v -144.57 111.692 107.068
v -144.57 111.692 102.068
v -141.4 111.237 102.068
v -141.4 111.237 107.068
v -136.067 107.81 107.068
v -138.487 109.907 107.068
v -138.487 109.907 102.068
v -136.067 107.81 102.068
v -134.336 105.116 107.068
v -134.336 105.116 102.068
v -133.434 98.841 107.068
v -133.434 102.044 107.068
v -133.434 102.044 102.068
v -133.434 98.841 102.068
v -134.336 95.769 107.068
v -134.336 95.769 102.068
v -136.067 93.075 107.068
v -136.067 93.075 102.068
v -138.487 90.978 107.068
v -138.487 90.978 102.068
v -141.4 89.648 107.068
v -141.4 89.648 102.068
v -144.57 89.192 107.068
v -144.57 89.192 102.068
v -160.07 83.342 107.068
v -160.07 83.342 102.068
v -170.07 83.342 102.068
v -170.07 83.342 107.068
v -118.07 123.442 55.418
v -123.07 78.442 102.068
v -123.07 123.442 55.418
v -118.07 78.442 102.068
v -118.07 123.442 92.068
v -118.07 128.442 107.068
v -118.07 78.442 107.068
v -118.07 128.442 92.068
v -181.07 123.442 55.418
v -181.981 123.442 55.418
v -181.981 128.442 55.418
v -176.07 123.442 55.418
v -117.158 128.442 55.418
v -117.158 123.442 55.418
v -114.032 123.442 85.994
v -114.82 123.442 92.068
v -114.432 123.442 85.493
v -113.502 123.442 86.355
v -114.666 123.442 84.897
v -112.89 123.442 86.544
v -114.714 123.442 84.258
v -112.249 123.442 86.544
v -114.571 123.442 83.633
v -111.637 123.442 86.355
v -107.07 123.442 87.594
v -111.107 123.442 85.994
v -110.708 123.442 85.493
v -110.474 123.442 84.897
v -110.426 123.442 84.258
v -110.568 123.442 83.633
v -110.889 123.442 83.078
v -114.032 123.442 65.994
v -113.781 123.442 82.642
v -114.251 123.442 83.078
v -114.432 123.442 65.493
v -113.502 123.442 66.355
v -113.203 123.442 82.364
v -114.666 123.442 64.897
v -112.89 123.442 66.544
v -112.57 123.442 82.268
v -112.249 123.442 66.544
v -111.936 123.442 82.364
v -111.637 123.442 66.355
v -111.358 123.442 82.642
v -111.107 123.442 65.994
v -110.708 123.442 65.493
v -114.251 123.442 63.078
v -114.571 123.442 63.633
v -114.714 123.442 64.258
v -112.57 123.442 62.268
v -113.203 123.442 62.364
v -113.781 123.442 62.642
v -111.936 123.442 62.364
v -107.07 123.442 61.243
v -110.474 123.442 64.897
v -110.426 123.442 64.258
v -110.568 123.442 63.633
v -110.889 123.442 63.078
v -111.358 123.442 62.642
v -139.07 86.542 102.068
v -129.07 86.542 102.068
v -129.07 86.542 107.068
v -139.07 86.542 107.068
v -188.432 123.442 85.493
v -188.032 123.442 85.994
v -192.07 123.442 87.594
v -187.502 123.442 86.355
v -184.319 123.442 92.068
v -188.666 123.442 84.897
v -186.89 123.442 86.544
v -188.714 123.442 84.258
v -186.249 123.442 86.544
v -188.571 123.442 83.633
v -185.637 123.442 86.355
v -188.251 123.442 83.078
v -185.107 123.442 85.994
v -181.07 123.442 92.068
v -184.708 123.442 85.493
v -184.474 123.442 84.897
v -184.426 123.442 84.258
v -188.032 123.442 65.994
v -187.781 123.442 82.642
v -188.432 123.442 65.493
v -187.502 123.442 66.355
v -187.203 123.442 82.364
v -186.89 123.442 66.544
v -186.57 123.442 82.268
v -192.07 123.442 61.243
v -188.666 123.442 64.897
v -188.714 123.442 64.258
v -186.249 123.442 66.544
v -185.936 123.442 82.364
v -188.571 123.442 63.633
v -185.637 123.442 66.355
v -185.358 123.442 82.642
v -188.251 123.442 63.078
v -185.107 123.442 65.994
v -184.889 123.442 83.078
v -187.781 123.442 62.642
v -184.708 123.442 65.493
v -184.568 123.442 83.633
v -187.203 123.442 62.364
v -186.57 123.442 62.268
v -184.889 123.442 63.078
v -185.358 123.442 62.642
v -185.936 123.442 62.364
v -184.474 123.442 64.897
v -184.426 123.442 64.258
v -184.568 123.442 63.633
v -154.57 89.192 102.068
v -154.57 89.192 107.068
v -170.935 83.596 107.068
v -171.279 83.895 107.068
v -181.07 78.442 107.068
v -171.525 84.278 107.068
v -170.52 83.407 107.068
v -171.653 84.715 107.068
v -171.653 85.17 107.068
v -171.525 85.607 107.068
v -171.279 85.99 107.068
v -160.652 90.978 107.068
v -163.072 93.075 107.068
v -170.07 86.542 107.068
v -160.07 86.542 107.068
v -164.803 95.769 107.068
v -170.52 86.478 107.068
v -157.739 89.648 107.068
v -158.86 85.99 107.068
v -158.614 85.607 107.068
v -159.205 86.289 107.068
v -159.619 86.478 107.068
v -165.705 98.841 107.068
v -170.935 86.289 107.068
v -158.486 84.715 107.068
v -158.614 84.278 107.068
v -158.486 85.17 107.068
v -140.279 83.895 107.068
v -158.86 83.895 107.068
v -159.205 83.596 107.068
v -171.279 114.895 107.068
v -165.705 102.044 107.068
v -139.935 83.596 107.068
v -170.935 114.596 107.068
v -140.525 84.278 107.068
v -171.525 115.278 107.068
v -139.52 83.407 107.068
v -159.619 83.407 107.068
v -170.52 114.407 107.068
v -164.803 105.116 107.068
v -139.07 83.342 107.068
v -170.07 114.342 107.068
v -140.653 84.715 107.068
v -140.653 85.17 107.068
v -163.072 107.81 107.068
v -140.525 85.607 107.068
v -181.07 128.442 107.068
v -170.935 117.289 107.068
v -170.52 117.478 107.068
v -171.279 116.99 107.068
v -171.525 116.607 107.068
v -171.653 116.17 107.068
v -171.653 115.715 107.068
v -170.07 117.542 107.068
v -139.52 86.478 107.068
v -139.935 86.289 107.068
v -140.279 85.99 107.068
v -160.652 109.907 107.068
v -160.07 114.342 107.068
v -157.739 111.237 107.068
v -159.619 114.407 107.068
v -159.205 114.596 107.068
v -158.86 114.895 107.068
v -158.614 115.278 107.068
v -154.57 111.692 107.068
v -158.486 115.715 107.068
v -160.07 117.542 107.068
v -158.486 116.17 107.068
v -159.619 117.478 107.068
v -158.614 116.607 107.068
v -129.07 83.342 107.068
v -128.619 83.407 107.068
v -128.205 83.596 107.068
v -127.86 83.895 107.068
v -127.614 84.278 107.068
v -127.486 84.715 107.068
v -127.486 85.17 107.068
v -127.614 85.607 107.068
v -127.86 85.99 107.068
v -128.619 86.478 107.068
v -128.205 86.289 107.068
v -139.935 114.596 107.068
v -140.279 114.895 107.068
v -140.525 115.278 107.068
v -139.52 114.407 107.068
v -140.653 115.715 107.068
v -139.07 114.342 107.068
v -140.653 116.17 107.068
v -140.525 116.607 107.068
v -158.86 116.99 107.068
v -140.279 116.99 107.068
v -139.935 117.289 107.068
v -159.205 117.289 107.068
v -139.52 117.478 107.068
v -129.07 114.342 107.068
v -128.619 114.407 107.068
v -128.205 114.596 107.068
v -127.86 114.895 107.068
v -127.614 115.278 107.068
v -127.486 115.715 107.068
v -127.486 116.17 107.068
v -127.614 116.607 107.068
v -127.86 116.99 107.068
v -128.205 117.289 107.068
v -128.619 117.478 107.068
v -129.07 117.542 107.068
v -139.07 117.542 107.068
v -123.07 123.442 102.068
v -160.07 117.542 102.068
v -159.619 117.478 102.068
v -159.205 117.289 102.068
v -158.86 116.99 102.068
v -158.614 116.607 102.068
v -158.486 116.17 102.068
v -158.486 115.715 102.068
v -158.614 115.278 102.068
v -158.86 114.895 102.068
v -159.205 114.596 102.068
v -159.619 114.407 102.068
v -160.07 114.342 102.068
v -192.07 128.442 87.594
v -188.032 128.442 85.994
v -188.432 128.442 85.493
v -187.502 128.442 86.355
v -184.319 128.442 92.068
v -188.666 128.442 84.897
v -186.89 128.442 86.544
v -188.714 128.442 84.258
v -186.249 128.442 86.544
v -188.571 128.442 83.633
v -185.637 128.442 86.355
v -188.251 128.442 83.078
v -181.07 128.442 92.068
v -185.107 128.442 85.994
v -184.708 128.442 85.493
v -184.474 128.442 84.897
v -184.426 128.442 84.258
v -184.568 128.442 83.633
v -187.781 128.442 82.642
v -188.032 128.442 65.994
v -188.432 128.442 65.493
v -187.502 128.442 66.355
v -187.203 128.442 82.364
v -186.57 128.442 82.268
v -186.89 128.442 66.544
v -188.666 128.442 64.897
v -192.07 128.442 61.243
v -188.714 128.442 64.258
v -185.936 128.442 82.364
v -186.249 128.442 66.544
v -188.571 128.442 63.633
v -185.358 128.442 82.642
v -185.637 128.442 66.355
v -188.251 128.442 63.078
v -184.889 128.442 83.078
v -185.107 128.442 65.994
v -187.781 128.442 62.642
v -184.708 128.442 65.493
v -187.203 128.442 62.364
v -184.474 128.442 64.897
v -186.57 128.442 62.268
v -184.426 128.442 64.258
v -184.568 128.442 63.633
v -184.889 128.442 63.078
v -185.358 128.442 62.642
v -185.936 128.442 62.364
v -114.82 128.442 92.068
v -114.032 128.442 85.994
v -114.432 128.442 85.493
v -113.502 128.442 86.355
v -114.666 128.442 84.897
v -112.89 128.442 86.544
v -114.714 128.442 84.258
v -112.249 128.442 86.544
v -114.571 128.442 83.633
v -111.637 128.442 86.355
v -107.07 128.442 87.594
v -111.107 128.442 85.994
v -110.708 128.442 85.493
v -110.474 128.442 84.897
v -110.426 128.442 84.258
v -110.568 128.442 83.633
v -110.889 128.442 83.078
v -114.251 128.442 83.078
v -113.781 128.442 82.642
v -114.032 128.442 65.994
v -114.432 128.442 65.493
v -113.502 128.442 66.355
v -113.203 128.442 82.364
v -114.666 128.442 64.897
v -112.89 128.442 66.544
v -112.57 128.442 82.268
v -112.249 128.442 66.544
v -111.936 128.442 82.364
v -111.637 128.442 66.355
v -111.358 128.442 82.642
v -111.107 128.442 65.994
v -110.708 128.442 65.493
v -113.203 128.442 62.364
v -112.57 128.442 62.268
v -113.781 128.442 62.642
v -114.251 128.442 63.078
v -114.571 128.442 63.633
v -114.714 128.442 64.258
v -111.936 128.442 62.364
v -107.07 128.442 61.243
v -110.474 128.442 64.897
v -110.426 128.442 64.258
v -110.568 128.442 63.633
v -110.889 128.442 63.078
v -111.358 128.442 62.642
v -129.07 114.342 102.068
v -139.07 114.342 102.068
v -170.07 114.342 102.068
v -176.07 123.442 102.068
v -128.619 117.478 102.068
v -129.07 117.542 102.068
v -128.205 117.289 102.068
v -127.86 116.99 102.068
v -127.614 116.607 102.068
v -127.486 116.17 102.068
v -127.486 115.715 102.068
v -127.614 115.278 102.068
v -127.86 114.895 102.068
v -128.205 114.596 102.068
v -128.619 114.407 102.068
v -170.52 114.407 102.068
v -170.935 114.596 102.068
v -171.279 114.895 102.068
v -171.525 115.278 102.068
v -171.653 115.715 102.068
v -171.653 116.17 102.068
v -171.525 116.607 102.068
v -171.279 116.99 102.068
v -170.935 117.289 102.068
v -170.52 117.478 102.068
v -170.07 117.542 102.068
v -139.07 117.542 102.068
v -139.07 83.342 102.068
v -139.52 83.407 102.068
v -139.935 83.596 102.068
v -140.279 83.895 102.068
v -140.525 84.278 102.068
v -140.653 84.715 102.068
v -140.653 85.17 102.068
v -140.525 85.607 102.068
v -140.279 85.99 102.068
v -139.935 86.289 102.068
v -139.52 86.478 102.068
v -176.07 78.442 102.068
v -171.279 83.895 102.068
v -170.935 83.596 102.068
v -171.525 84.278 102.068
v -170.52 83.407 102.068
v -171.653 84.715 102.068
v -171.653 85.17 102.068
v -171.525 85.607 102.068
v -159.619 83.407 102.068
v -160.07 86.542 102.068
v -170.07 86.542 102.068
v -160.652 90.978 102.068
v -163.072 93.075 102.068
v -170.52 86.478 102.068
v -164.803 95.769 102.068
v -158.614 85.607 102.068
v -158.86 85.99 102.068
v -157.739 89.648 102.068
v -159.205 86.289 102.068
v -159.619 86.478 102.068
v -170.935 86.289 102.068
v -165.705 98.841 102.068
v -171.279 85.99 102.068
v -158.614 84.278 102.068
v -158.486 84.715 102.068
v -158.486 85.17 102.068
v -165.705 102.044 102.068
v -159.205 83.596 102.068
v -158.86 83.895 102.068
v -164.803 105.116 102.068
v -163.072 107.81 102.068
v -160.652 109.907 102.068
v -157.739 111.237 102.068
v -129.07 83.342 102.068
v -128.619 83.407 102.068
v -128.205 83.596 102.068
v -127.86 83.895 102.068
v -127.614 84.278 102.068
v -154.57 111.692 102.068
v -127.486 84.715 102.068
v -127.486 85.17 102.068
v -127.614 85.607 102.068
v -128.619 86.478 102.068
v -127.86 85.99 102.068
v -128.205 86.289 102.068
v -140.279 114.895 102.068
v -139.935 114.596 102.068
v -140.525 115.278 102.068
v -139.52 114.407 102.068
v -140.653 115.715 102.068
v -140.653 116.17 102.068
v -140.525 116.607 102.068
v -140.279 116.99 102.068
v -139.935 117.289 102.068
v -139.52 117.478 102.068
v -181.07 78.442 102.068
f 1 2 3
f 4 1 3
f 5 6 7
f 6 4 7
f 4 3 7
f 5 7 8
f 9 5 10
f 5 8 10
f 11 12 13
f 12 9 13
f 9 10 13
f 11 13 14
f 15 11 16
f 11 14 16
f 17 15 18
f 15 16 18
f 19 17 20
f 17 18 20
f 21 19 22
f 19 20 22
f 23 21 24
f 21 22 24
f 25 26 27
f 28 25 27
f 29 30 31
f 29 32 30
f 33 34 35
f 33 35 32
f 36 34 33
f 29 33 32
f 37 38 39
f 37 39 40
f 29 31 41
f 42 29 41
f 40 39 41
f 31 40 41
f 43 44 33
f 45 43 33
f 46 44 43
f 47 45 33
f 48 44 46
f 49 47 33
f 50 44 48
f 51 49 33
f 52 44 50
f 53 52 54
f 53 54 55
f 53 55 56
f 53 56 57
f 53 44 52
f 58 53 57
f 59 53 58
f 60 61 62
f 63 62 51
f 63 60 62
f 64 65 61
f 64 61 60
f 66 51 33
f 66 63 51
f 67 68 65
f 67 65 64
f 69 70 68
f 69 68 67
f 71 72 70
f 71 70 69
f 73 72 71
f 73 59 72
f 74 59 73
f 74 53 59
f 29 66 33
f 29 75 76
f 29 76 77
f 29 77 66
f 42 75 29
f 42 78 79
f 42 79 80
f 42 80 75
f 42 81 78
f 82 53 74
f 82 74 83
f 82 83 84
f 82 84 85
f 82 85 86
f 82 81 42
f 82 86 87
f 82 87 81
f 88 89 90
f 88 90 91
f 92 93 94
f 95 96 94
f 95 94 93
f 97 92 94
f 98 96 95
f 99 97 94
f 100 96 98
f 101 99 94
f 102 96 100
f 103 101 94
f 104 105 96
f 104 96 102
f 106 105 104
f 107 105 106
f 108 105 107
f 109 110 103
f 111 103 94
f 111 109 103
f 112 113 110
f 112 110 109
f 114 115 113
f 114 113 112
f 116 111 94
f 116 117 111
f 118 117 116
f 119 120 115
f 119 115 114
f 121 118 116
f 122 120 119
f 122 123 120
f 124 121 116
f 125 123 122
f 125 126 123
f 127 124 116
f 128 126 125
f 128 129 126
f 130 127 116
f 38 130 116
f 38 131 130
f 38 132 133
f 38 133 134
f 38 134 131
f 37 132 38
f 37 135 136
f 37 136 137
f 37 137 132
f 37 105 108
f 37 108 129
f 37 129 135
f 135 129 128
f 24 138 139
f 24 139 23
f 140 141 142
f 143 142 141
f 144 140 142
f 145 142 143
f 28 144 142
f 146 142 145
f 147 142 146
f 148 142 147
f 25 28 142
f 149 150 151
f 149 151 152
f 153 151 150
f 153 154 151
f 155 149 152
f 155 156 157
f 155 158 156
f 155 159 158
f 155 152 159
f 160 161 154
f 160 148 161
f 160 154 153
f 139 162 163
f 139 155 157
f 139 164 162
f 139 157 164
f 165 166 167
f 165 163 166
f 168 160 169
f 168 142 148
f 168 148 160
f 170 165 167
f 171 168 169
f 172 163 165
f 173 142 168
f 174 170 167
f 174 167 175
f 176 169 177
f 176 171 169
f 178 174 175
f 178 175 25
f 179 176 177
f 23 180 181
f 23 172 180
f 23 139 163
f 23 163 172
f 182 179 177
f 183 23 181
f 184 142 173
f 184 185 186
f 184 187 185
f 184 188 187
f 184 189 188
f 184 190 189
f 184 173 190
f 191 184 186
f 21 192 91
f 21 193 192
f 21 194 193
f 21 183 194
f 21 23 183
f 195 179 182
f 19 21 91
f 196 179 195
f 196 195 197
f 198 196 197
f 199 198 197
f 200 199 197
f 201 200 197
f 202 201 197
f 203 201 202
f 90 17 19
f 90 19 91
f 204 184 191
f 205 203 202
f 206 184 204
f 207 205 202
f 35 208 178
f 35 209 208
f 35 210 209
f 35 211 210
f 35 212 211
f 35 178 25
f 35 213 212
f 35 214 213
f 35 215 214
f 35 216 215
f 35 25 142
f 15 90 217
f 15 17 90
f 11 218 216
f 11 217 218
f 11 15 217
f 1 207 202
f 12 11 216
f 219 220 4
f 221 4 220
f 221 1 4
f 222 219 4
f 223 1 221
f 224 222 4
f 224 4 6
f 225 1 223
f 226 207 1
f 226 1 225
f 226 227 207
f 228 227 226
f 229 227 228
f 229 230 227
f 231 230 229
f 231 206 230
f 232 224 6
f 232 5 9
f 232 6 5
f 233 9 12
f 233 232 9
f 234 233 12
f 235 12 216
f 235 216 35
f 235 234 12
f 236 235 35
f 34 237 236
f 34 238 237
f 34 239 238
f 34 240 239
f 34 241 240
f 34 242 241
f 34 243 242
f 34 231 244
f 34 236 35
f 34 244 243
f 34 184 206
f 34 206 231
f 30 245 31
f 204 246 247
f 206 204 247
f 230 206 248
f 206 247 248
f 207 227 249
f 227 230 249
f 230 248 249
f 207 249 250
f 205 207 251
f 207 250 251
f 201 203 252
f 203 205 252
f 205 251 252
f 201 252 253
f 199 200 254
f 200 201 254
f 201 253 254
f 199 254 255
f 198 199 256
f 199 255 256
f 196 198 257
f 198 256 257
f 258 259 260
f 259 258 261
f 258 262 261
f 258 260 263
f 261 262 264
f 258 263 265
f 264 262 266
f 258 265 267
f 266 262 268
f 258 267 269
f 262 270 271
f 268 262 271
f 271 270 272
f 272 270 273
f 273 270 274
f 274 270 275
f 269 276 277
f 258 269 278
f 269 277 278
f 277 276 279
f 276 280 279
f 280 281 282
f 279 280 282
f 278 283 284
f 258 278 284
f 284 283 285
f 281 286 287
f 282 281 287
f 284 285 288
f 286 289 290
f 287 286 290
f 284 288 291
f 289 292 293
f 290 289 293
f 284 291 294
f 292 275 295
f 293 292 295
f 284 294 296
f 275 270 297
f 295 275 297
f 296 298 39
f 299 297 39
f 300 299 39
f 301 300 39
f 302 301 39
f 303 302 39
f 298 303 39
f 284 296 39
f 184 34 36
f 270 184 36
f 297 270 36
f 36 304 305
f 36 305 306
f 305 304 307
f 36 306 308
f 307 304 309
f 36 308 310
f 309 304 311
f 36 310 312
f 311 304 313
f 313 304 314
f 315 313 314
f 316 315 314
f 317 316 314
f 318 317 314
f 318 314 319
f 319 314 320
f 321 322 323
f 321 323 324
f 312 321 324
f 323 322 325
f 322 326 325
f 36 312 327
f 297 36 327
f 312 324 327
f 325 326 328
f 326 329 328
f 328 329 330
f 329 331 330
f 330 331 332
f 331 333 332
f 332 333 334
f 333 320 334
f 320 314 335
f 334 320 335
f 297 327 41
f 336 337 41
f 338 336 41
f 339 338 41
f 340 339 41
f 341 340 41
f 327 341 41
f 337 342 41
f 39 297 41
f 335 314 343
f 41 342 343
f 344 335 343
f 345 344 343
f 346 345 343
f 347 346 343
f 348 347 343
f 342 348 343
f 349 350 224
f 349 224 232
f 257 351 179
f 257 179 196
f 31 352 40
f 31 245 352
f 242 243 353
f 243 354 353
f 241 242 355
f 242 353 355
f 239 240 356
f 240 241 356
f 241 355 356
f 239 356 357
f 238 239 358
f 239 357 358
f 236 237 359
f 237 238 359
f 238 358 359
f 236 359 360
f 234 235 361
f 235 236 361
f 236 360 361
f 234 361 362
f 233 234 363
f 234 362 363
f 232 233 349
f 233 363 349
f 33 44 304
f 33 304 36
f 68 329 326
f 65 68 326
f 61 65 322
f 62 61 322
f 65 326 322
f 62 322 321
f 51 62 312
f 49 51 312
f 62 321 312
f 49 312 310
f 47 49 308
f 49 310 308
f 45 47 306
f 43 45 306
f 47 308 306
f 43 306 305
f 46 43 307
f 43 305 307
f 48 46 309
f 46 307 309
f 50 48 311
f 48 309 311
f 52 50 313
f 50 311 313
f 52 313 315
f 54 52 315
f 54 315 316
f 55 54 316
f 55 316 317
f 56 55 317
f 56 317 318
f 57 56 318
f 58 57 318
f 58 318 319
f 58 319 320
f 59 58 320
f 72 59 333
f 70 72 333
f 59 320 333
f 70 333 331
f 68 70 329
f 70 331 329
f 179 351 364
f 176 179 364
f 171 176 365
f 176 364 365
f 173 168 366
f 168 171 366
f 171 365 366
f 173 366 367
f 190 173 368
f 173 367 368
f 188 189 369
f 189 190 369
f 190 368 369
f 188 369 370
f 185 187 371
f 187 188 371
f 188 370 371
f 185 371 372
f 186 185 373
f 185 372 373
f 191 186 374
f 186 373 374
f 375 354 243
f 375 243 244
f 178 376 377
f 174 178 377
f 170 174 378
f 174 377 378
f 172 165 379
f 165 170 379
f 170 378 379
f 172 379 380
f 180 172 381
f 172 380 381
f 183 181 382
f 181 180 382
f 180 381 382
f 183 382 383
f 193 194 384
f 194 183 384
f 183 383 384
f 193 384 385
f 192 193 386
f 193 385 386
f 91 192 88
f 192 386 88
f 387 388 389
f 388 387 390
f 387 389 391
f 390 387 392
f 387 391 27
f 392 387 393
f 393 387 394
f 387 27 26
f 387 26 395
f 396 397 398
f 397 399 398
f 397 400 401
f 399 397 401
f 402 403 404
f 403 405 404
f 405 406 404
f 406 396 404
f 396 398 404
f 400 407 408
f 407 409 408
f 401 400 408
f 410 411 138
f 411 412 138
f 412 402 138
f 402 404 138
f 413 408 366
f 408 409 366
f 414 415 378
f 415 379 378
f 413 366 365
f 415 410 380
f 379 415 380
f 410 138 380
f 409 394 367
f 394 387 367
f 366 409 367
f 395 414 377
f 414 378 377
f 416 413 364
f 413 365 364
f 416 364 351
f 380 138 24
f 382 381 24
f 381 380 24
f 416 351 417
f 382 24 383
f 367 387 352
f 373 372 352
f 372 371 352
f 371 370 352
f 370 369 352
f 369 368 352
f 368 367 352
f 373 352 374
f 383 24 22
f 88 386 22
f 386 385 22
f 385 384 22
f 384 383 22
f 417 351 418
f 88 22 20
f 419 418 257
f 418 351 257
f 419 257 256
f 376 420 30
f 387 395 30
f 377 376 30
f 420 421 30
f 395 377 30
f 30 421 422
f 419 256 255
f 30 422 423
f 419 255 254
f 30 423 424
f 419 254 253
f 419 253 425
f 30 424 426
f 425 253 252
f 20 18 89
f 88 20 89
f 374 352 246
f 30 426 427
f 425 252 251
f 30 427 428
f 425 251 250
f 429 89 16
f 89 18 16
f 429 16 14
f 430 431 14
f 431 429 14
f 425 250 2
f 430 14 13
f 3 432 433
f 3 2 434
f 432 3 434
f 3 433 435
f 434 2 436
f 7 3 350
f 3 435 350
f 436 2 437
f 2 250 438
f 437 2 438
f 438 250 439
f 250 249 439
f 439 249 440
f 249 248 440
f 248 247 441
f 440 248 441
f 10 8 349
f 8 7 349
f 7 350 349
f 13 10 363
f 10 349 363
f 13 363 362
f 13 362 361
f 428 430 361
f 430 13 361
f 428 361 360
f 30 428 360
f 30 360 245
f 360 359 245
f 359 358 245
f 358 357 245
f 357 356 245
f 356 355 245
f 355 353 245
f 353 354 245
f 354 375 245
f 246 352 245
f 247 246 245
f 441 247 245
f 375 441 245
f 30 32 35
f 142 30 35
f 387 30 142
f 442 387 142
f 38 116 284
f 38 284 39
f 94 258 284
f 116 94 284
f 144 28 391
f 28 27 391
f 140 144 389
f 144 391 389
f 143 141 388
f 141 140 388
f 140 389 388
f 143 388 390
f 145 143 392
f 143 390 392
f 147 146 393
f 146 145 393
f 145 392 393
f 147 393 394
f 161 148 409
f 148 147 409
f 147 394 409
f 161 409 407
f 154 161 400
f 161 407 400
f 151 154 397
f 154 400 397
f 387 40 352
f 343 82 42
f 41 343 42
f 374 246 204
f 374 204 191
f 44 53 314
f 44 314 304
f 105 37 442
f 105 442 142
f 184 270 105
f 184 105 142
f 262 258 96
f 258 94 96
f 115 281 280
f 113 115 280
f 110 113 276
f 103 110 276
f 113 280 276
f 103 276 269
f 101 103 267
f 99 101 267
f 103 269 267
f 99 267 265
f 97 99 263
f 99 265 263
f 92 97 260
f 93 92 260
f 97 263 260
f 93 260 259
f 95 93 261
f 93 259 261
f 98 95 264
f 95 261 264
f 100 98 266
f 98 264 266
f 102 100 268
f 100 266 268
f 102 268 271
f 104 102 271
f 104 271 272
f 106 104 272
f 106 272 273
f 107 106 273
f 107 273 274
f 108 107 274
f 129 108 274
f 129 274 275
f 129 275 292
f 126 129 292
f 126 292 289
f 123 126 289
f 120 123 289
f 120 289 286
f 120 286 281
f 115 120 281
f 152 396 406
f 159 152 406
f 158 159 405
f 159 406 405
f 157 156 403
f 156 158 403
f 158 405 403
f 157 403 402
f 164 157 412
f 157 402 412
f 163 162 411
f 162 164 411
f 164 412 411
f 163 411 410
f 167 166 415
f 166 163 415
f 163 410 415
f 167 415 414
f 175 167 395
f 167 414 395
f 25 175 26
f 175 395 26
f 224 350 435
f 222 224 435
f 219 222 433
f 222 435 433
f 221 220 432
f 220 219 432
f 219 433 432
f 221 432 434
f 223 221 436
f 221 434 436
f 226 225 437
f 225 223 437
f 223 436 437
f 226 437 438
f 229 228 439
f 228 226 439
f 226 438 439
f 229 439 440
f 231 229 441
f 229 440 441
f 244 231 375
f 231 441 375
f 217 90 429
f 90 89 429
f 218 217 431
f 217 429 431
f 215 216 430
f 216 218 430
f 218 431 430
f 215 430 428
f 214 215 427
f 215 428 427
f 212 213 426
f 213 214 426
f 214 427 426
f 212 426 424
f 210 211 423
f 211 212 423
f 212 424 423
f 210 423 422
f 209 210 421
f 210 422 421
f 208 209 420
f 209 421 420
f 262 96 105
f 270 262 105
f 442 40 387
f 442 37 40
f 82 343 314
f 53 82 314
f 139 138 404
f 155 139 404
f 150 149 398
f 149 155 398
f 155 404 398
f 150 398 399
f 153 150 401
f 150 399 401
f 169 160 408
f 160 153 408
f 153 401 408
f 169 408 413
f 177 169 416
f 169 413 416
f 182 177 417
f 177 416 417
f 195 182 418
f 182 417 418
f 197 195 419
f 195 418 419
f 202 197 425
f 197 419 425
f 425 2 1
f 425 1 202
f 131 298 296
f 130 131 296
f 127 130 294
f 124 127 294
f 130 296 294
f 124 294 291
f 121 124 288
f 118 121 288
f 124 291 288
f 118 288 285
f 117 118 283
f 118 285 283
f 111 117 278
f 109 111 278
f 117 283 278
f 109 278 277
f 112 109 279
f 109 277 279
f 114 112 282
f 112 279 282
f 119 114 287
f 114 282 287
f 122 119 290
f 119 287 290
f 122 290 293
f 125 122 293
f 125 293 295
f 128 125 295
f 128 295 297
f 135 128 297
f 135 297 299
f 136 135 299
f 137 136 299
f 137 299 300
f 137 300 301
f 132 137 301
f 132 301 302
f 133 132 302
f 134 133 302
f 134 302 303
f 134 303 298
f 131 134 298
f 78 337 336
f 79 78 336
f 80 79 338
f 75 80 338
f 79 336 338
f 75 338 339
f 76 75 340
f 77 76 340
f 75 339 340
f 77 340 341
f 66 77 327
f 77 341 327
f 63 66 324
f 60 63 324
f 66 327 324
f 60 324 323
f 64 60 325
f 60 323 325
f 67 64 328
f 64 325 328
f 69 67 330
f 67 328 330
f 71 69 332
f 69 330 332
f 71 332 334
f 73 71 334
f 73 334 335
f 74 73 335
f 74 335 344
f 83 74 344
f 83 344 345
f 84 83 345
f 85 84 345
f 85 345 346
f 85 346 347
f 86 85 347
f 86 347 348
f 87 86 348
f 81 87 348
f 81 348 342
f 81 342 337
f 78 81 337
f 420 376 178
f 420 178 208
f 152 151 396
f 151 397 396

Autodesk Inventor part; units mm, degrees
ref_plane "XZ Plane" through (0, 0, 0) normal (0, 1, 0) x (-1, 0, 0)
ref_plane "XY Plane" through (0, 0, 0) normal (0, 0, 1) x (1, 0, 0)
ref_plane "Work Plane1" through (-118.9196, 128.4425, 80.2184) normal (0, -1, 0) x (0, 0, -1)
sketch "Sketch1" plane through (-118.9196, 128.4425, 80.2184) normal (0, -1, 0) x (0, 0, -1)
  line L0 (-4.2, -124) -> (-4.2, 744) construction
  line L1 (15.8, -124) -> (15.8, 744) construction
  line L2 (25.8, 100) -> (25.8, 520) construction
  line L3 (-21.85, -73.15) -> (24.8, -73.15)
  line L4 (24.8, -73.15) -> (24.8, 11.85)
  line L5 (24.8, 11.85) -> (-21.85, 11.85)
  line L6 (-21.85, 11.85) -> (-21.85, -73.15)
  line L7 (25.8, -30.65) -> (5.6685, -30.65) construction
  circle A0 centre (15.8, -67.65) radius 5.5 construction
  circle A1 centre (15.8, 6.35) radius 5.5 construction
  line L8 (5.8, -58.8473) -> (5.8, 42.3952) construction
  circle A2 centre (-4.2, -67.65) radius 5.5 construction
  circle A3 centre (-4.2, 6.35) radius 5.5 construction
  point P0 (80.2184, 118.9196)
  point P1 (18.9754, -73.15)
  point P2 (24.8, -26.5615)
  dimension "d0" = 1
  dimension "d1" = 47.65
  dimension "d3" = 11
  dimension "d4" = 63
  dimension "d7" = 0
  dimension "d9" = 10
  dimension "d10" = 10
extrude "Extrusion1" add sketch "Sketch1" along normal blind 5
ref_plane "Work Plane2" through (-149.5696, 123.4425, 102.0684) normal (1, 0, 0) x (0, 1, 0)
sketch "Sketch4" plane through (-192.0696, 128.4425, 102.0684) normal (0, 0, 1) x (1, 0, 0)
  line L0 (85, 0) -> (0, 0) construction
  line L1 (0, 0) -> (0, -5) construction
  line L2 (85, -5) -> (0, -5) construction
  line L3 (85, 0) -> (85, -5) construction
  line L4 (0, 0) -> (85, 0) construction
  line L5 (42.5, 0) -> (42.5, -58.6666) construction
  line L6 (11, 0) -> (74, 0)
  line L7 (74, 0) -> (74, -50)
  line L8 (74, -50) -> (11, -50)
  line L9 (11, -50) -> (11, 0)
  line L10 (27, -43.5) -> (58, -43.5) construction
  line L11 (58, -43.5) -> (58, -12.5) construction
  line L12 (58, -12.5) -> (27, -12.5) construction
  line L13 (27, -12.5) -> (27, -43.5) construction
  line L14 (27, -43.5) -> (58, -12.5) construction
  line L15 (58, -43.5) -> (27, -12.5) construction
  line L16 (32, -12.5) -> (22, -12.5) construction
  line L17 (32, -10.9) -> (22, -10.9)
  line L18 (22, -14.1) -> (32, -14.1)
  arc A0 (32, -14.1) -> (32, -10.9) centre (32, -12.5) ccw
  arc A1 (22, -10.9) -> (22, -14.1) centre (22, -12.5) ccw
  line L19 (53, -12.5) -> (63, -12.5) construction
  line L20 (53, -14.1) -> (63, -14.1)
  line L21 (63, -10.9) -> (53, -10.9)
  arc A2 (53, -10.9) -> (53, -14.1) centre (53, -12.5) ccw
  arc A3 (63, -14.1) -> (63, -10.9) centre (63, -12.5) ccw
  line L22 (32, -43.5) -> (22, -43.5) construction
  line L23 (32, -45.1) -> (22, -45.1)
  line L24 (22, -41.9) -> (32, -41.9)
  arc A4 (32, -45.1) -> (32, -41.9) centre (32, -43.5) ccw
  arc A5 (22, -41.9) -> (22, -45.1) centre (22, -43.5) ccw
  line L25 (53, -43.5) -> (63, -43.5) construction
  line L26 (53, -45.1) -> (63, -45.1)
  line L27 (63, -41.9) -> (53, -41.9)
  arc A6 (53, -41.9) -> (53, -45.1) centre (53, -43.5) ccw
  arc A7 (63, -45.1) -> (63, -41.9) centre (63, -43.5) ccw
  line L28 (37.5, -28) -> (47.5, -28) construction
  line L29 (37.5, -39.25) -> (47.5, -39.25)
  line L30 (47.5, -16.75) -> (37.5, -16.75)
  arc A8 (37.5, -16.75) -> (37.5, -39.25) centre (37.5, -28) ccw
  arc A9 (47.5, -39.25) -> (47.5, -16.75) centre (47.5, -28) ccw
  point P0 (192.0696, -128.4425)
  point P1 (42.5, -28)
  dimension "d14" = 63
  dimension "d15" = 45
  dimension "d16" = 31
  dimension "d17" = 31
  dimension "d18" = 3.2
  dimension "d19" = 10
  dimension "d21" = 10
  dimension "d22" = 1.6
  dimension "d23" = 10
  dimension "d24" = 10
  dimension "d25" = 1.6
  dimension "d26" = 1.6
  dimension "d27" = 22.5
  dimension "d28" = 10
extrude "Extrusion2" add sketch "Sketch4" along normal blind 5
sketch "Sketch5" plane through (-181.0696, 78.4425, 102.0684) normal (-1, 0, 0) x (0, 0, 1)
  line L0 (0, 45) -> (0, 0) projected
  line L1 (0, 45) -> (-46.65, 45) projected
  line L2 (-46.65, 50) -> (-46.65, 45) projected
  line L3 (0, 0) -> (0, 45) projected
  line L4 (-46.65, 45) -> (0, 0)
  point P0 (-102.0684, -78.4425)
extrude "Extrusion3" add sketch "Sketch5" against normal blind 5
sketch "Sketch6" plane through (-118.0696, 78.4425, 102.0684) normal (1, 0, 0) x (0, 0, -1)
  line L0 (0, 0) -> (46.65, 45) projected
  line L1 (0, 45) -> (46.65, 45) projected
  line L2 (0, 0) -> (0, 45) projected
  point P0 (102.0684, -78.4425)
extrude "Extrusion4" add sketch "Sketch6" against normal blind 5
sketch "Sketch7" plane through (-118.9196, 123.4425, 80.2184) normal (0, -1, 0) x (1, 0, 0)
  circle A0 centre (-67.65, -15.8) radius 5.5 construction
  circle A1 centre (-67.65, 4.2) radius 5.5 construction
  circle A2 centre (6.35, 4.2) radius 5.5 construction
  circle A3 centre (6.35, -15.8) radius 5.5 construction
  point P0 (118.9196, -80.2184)
hole "Hole1" at (-186.5696, 123.4425, 84.4184) at (-186.5696, 123.4425, 64.4184) at (-112.5696, 123.4425, 64.4184) at (-112.5696, 123.4425, 84.4184) direction (0, 1, 0) diameter 4.3 end through all clearance for "Hex Head Cap Screw DIN EN 24017" size "M4" standard "DIN"
sketch "Sketch8" plane through (-118.9196, 123.4425, 80.2184) normal (0, -1, 0) x (1, 0, 0)
  circle A0 centre (-67.65, 4.2) radius 2.15 projected
  circle A1 centre (-67.65, -15.8) radius 2.15 projected
  line L0 (-62.15, -24.8) -> (-62.15, 21.85) projected
  line L1 (-62.15, 21.85) -> (-73.15, 21.85) projected
  line L2 (-73.15, 21.85) -> (-73.15, -24.8) projected
  line L3 (-73.15, -24.8) -> (-62.15, -24.8) projected
  circle A2 centre (6.35, -15.8) radius 2.15 projected
  circle A3 centre (6.35, 4.2) radius 2.15 projected
  line L4 (0.85, 21.85) -> (0.85, -24.8) projected
  line L5 (0.85, -24.8) -> (11.85, -24.8) projected
  line L6 (11.85, -24.8) -> (11.85, 21.85) projected
  line L7 (11.85, 21.85) -> (0.85, 21.85) projected
  line L8 (-73.15, 7.3754) -> (-65.3998, 11.85)
  line L9 (-73.15, -18.9754) -> (-62.15, -25.3263)
  line L10 (11.85, 7.3754) -> (4.0998, 11.85)
  line L11 (11.85, -18.9754) -> (0.85, -25.3263)
  line L12 (-65.3998, 11.85) -> (-62.15, 11.85)
  line L13 (4.0998, 11.85) -> (0.85, 11.85)
  point P0 (118.9196, -80.2184)
  point P1 (37.3678, 12.85)
  point P2 (-28.6678, 12.85)
  point P3 (1.7615, -24.8)
  point P4 (-63.0615, -24.8)
  point P5 (37.3678, 12.85)
  dimension "d42" = 60
  dimension "d43" = 5.5
  dimension "d44" = 60
  dimension "d45" = 5.5
  dimension "d46" = 60
  dimension "d47" = 5.5
  dimension "d48" = 60
  dimension "d49" = 5.5
  dimension "d53" = 7.65
  dimension "d54" = 7.65
extrude "Extrusion5" cut sketch "Sketch8" against normal blind 5 contours L12 L8 L2 L1 L0 | L3 L2 L9 | L7 L6 L10 L13 L4 | L11 L6 L5
equation "\"d1\" = MOTOR_HEIGHT"
equation "\"d9\" = d10"
equation "\"d19\" = SLOT_PLAY"
equation "\"d21\" = d19"
equation "\"d22\" = 0.5 * d18"
equation "\"d23\" = d19"
equation "\"d24\" = d19"
equation "\"d25\" = d22"
equation "\"d26\" = d22"
equation "\"d28\" = SLOT_PLAY"
equation "\"d44\" = d42"
equation "\"d45\" = d43"
equation "\"d47\" = d43"
equation "\"d49\" = d45"
equation "\"d54\" = d53"
equation "\"MOTOR_HEIGHT\" = 47.65"
equation "\"SLOT_PLAY\" = 10"
properties part number "MotorBracketV2"
